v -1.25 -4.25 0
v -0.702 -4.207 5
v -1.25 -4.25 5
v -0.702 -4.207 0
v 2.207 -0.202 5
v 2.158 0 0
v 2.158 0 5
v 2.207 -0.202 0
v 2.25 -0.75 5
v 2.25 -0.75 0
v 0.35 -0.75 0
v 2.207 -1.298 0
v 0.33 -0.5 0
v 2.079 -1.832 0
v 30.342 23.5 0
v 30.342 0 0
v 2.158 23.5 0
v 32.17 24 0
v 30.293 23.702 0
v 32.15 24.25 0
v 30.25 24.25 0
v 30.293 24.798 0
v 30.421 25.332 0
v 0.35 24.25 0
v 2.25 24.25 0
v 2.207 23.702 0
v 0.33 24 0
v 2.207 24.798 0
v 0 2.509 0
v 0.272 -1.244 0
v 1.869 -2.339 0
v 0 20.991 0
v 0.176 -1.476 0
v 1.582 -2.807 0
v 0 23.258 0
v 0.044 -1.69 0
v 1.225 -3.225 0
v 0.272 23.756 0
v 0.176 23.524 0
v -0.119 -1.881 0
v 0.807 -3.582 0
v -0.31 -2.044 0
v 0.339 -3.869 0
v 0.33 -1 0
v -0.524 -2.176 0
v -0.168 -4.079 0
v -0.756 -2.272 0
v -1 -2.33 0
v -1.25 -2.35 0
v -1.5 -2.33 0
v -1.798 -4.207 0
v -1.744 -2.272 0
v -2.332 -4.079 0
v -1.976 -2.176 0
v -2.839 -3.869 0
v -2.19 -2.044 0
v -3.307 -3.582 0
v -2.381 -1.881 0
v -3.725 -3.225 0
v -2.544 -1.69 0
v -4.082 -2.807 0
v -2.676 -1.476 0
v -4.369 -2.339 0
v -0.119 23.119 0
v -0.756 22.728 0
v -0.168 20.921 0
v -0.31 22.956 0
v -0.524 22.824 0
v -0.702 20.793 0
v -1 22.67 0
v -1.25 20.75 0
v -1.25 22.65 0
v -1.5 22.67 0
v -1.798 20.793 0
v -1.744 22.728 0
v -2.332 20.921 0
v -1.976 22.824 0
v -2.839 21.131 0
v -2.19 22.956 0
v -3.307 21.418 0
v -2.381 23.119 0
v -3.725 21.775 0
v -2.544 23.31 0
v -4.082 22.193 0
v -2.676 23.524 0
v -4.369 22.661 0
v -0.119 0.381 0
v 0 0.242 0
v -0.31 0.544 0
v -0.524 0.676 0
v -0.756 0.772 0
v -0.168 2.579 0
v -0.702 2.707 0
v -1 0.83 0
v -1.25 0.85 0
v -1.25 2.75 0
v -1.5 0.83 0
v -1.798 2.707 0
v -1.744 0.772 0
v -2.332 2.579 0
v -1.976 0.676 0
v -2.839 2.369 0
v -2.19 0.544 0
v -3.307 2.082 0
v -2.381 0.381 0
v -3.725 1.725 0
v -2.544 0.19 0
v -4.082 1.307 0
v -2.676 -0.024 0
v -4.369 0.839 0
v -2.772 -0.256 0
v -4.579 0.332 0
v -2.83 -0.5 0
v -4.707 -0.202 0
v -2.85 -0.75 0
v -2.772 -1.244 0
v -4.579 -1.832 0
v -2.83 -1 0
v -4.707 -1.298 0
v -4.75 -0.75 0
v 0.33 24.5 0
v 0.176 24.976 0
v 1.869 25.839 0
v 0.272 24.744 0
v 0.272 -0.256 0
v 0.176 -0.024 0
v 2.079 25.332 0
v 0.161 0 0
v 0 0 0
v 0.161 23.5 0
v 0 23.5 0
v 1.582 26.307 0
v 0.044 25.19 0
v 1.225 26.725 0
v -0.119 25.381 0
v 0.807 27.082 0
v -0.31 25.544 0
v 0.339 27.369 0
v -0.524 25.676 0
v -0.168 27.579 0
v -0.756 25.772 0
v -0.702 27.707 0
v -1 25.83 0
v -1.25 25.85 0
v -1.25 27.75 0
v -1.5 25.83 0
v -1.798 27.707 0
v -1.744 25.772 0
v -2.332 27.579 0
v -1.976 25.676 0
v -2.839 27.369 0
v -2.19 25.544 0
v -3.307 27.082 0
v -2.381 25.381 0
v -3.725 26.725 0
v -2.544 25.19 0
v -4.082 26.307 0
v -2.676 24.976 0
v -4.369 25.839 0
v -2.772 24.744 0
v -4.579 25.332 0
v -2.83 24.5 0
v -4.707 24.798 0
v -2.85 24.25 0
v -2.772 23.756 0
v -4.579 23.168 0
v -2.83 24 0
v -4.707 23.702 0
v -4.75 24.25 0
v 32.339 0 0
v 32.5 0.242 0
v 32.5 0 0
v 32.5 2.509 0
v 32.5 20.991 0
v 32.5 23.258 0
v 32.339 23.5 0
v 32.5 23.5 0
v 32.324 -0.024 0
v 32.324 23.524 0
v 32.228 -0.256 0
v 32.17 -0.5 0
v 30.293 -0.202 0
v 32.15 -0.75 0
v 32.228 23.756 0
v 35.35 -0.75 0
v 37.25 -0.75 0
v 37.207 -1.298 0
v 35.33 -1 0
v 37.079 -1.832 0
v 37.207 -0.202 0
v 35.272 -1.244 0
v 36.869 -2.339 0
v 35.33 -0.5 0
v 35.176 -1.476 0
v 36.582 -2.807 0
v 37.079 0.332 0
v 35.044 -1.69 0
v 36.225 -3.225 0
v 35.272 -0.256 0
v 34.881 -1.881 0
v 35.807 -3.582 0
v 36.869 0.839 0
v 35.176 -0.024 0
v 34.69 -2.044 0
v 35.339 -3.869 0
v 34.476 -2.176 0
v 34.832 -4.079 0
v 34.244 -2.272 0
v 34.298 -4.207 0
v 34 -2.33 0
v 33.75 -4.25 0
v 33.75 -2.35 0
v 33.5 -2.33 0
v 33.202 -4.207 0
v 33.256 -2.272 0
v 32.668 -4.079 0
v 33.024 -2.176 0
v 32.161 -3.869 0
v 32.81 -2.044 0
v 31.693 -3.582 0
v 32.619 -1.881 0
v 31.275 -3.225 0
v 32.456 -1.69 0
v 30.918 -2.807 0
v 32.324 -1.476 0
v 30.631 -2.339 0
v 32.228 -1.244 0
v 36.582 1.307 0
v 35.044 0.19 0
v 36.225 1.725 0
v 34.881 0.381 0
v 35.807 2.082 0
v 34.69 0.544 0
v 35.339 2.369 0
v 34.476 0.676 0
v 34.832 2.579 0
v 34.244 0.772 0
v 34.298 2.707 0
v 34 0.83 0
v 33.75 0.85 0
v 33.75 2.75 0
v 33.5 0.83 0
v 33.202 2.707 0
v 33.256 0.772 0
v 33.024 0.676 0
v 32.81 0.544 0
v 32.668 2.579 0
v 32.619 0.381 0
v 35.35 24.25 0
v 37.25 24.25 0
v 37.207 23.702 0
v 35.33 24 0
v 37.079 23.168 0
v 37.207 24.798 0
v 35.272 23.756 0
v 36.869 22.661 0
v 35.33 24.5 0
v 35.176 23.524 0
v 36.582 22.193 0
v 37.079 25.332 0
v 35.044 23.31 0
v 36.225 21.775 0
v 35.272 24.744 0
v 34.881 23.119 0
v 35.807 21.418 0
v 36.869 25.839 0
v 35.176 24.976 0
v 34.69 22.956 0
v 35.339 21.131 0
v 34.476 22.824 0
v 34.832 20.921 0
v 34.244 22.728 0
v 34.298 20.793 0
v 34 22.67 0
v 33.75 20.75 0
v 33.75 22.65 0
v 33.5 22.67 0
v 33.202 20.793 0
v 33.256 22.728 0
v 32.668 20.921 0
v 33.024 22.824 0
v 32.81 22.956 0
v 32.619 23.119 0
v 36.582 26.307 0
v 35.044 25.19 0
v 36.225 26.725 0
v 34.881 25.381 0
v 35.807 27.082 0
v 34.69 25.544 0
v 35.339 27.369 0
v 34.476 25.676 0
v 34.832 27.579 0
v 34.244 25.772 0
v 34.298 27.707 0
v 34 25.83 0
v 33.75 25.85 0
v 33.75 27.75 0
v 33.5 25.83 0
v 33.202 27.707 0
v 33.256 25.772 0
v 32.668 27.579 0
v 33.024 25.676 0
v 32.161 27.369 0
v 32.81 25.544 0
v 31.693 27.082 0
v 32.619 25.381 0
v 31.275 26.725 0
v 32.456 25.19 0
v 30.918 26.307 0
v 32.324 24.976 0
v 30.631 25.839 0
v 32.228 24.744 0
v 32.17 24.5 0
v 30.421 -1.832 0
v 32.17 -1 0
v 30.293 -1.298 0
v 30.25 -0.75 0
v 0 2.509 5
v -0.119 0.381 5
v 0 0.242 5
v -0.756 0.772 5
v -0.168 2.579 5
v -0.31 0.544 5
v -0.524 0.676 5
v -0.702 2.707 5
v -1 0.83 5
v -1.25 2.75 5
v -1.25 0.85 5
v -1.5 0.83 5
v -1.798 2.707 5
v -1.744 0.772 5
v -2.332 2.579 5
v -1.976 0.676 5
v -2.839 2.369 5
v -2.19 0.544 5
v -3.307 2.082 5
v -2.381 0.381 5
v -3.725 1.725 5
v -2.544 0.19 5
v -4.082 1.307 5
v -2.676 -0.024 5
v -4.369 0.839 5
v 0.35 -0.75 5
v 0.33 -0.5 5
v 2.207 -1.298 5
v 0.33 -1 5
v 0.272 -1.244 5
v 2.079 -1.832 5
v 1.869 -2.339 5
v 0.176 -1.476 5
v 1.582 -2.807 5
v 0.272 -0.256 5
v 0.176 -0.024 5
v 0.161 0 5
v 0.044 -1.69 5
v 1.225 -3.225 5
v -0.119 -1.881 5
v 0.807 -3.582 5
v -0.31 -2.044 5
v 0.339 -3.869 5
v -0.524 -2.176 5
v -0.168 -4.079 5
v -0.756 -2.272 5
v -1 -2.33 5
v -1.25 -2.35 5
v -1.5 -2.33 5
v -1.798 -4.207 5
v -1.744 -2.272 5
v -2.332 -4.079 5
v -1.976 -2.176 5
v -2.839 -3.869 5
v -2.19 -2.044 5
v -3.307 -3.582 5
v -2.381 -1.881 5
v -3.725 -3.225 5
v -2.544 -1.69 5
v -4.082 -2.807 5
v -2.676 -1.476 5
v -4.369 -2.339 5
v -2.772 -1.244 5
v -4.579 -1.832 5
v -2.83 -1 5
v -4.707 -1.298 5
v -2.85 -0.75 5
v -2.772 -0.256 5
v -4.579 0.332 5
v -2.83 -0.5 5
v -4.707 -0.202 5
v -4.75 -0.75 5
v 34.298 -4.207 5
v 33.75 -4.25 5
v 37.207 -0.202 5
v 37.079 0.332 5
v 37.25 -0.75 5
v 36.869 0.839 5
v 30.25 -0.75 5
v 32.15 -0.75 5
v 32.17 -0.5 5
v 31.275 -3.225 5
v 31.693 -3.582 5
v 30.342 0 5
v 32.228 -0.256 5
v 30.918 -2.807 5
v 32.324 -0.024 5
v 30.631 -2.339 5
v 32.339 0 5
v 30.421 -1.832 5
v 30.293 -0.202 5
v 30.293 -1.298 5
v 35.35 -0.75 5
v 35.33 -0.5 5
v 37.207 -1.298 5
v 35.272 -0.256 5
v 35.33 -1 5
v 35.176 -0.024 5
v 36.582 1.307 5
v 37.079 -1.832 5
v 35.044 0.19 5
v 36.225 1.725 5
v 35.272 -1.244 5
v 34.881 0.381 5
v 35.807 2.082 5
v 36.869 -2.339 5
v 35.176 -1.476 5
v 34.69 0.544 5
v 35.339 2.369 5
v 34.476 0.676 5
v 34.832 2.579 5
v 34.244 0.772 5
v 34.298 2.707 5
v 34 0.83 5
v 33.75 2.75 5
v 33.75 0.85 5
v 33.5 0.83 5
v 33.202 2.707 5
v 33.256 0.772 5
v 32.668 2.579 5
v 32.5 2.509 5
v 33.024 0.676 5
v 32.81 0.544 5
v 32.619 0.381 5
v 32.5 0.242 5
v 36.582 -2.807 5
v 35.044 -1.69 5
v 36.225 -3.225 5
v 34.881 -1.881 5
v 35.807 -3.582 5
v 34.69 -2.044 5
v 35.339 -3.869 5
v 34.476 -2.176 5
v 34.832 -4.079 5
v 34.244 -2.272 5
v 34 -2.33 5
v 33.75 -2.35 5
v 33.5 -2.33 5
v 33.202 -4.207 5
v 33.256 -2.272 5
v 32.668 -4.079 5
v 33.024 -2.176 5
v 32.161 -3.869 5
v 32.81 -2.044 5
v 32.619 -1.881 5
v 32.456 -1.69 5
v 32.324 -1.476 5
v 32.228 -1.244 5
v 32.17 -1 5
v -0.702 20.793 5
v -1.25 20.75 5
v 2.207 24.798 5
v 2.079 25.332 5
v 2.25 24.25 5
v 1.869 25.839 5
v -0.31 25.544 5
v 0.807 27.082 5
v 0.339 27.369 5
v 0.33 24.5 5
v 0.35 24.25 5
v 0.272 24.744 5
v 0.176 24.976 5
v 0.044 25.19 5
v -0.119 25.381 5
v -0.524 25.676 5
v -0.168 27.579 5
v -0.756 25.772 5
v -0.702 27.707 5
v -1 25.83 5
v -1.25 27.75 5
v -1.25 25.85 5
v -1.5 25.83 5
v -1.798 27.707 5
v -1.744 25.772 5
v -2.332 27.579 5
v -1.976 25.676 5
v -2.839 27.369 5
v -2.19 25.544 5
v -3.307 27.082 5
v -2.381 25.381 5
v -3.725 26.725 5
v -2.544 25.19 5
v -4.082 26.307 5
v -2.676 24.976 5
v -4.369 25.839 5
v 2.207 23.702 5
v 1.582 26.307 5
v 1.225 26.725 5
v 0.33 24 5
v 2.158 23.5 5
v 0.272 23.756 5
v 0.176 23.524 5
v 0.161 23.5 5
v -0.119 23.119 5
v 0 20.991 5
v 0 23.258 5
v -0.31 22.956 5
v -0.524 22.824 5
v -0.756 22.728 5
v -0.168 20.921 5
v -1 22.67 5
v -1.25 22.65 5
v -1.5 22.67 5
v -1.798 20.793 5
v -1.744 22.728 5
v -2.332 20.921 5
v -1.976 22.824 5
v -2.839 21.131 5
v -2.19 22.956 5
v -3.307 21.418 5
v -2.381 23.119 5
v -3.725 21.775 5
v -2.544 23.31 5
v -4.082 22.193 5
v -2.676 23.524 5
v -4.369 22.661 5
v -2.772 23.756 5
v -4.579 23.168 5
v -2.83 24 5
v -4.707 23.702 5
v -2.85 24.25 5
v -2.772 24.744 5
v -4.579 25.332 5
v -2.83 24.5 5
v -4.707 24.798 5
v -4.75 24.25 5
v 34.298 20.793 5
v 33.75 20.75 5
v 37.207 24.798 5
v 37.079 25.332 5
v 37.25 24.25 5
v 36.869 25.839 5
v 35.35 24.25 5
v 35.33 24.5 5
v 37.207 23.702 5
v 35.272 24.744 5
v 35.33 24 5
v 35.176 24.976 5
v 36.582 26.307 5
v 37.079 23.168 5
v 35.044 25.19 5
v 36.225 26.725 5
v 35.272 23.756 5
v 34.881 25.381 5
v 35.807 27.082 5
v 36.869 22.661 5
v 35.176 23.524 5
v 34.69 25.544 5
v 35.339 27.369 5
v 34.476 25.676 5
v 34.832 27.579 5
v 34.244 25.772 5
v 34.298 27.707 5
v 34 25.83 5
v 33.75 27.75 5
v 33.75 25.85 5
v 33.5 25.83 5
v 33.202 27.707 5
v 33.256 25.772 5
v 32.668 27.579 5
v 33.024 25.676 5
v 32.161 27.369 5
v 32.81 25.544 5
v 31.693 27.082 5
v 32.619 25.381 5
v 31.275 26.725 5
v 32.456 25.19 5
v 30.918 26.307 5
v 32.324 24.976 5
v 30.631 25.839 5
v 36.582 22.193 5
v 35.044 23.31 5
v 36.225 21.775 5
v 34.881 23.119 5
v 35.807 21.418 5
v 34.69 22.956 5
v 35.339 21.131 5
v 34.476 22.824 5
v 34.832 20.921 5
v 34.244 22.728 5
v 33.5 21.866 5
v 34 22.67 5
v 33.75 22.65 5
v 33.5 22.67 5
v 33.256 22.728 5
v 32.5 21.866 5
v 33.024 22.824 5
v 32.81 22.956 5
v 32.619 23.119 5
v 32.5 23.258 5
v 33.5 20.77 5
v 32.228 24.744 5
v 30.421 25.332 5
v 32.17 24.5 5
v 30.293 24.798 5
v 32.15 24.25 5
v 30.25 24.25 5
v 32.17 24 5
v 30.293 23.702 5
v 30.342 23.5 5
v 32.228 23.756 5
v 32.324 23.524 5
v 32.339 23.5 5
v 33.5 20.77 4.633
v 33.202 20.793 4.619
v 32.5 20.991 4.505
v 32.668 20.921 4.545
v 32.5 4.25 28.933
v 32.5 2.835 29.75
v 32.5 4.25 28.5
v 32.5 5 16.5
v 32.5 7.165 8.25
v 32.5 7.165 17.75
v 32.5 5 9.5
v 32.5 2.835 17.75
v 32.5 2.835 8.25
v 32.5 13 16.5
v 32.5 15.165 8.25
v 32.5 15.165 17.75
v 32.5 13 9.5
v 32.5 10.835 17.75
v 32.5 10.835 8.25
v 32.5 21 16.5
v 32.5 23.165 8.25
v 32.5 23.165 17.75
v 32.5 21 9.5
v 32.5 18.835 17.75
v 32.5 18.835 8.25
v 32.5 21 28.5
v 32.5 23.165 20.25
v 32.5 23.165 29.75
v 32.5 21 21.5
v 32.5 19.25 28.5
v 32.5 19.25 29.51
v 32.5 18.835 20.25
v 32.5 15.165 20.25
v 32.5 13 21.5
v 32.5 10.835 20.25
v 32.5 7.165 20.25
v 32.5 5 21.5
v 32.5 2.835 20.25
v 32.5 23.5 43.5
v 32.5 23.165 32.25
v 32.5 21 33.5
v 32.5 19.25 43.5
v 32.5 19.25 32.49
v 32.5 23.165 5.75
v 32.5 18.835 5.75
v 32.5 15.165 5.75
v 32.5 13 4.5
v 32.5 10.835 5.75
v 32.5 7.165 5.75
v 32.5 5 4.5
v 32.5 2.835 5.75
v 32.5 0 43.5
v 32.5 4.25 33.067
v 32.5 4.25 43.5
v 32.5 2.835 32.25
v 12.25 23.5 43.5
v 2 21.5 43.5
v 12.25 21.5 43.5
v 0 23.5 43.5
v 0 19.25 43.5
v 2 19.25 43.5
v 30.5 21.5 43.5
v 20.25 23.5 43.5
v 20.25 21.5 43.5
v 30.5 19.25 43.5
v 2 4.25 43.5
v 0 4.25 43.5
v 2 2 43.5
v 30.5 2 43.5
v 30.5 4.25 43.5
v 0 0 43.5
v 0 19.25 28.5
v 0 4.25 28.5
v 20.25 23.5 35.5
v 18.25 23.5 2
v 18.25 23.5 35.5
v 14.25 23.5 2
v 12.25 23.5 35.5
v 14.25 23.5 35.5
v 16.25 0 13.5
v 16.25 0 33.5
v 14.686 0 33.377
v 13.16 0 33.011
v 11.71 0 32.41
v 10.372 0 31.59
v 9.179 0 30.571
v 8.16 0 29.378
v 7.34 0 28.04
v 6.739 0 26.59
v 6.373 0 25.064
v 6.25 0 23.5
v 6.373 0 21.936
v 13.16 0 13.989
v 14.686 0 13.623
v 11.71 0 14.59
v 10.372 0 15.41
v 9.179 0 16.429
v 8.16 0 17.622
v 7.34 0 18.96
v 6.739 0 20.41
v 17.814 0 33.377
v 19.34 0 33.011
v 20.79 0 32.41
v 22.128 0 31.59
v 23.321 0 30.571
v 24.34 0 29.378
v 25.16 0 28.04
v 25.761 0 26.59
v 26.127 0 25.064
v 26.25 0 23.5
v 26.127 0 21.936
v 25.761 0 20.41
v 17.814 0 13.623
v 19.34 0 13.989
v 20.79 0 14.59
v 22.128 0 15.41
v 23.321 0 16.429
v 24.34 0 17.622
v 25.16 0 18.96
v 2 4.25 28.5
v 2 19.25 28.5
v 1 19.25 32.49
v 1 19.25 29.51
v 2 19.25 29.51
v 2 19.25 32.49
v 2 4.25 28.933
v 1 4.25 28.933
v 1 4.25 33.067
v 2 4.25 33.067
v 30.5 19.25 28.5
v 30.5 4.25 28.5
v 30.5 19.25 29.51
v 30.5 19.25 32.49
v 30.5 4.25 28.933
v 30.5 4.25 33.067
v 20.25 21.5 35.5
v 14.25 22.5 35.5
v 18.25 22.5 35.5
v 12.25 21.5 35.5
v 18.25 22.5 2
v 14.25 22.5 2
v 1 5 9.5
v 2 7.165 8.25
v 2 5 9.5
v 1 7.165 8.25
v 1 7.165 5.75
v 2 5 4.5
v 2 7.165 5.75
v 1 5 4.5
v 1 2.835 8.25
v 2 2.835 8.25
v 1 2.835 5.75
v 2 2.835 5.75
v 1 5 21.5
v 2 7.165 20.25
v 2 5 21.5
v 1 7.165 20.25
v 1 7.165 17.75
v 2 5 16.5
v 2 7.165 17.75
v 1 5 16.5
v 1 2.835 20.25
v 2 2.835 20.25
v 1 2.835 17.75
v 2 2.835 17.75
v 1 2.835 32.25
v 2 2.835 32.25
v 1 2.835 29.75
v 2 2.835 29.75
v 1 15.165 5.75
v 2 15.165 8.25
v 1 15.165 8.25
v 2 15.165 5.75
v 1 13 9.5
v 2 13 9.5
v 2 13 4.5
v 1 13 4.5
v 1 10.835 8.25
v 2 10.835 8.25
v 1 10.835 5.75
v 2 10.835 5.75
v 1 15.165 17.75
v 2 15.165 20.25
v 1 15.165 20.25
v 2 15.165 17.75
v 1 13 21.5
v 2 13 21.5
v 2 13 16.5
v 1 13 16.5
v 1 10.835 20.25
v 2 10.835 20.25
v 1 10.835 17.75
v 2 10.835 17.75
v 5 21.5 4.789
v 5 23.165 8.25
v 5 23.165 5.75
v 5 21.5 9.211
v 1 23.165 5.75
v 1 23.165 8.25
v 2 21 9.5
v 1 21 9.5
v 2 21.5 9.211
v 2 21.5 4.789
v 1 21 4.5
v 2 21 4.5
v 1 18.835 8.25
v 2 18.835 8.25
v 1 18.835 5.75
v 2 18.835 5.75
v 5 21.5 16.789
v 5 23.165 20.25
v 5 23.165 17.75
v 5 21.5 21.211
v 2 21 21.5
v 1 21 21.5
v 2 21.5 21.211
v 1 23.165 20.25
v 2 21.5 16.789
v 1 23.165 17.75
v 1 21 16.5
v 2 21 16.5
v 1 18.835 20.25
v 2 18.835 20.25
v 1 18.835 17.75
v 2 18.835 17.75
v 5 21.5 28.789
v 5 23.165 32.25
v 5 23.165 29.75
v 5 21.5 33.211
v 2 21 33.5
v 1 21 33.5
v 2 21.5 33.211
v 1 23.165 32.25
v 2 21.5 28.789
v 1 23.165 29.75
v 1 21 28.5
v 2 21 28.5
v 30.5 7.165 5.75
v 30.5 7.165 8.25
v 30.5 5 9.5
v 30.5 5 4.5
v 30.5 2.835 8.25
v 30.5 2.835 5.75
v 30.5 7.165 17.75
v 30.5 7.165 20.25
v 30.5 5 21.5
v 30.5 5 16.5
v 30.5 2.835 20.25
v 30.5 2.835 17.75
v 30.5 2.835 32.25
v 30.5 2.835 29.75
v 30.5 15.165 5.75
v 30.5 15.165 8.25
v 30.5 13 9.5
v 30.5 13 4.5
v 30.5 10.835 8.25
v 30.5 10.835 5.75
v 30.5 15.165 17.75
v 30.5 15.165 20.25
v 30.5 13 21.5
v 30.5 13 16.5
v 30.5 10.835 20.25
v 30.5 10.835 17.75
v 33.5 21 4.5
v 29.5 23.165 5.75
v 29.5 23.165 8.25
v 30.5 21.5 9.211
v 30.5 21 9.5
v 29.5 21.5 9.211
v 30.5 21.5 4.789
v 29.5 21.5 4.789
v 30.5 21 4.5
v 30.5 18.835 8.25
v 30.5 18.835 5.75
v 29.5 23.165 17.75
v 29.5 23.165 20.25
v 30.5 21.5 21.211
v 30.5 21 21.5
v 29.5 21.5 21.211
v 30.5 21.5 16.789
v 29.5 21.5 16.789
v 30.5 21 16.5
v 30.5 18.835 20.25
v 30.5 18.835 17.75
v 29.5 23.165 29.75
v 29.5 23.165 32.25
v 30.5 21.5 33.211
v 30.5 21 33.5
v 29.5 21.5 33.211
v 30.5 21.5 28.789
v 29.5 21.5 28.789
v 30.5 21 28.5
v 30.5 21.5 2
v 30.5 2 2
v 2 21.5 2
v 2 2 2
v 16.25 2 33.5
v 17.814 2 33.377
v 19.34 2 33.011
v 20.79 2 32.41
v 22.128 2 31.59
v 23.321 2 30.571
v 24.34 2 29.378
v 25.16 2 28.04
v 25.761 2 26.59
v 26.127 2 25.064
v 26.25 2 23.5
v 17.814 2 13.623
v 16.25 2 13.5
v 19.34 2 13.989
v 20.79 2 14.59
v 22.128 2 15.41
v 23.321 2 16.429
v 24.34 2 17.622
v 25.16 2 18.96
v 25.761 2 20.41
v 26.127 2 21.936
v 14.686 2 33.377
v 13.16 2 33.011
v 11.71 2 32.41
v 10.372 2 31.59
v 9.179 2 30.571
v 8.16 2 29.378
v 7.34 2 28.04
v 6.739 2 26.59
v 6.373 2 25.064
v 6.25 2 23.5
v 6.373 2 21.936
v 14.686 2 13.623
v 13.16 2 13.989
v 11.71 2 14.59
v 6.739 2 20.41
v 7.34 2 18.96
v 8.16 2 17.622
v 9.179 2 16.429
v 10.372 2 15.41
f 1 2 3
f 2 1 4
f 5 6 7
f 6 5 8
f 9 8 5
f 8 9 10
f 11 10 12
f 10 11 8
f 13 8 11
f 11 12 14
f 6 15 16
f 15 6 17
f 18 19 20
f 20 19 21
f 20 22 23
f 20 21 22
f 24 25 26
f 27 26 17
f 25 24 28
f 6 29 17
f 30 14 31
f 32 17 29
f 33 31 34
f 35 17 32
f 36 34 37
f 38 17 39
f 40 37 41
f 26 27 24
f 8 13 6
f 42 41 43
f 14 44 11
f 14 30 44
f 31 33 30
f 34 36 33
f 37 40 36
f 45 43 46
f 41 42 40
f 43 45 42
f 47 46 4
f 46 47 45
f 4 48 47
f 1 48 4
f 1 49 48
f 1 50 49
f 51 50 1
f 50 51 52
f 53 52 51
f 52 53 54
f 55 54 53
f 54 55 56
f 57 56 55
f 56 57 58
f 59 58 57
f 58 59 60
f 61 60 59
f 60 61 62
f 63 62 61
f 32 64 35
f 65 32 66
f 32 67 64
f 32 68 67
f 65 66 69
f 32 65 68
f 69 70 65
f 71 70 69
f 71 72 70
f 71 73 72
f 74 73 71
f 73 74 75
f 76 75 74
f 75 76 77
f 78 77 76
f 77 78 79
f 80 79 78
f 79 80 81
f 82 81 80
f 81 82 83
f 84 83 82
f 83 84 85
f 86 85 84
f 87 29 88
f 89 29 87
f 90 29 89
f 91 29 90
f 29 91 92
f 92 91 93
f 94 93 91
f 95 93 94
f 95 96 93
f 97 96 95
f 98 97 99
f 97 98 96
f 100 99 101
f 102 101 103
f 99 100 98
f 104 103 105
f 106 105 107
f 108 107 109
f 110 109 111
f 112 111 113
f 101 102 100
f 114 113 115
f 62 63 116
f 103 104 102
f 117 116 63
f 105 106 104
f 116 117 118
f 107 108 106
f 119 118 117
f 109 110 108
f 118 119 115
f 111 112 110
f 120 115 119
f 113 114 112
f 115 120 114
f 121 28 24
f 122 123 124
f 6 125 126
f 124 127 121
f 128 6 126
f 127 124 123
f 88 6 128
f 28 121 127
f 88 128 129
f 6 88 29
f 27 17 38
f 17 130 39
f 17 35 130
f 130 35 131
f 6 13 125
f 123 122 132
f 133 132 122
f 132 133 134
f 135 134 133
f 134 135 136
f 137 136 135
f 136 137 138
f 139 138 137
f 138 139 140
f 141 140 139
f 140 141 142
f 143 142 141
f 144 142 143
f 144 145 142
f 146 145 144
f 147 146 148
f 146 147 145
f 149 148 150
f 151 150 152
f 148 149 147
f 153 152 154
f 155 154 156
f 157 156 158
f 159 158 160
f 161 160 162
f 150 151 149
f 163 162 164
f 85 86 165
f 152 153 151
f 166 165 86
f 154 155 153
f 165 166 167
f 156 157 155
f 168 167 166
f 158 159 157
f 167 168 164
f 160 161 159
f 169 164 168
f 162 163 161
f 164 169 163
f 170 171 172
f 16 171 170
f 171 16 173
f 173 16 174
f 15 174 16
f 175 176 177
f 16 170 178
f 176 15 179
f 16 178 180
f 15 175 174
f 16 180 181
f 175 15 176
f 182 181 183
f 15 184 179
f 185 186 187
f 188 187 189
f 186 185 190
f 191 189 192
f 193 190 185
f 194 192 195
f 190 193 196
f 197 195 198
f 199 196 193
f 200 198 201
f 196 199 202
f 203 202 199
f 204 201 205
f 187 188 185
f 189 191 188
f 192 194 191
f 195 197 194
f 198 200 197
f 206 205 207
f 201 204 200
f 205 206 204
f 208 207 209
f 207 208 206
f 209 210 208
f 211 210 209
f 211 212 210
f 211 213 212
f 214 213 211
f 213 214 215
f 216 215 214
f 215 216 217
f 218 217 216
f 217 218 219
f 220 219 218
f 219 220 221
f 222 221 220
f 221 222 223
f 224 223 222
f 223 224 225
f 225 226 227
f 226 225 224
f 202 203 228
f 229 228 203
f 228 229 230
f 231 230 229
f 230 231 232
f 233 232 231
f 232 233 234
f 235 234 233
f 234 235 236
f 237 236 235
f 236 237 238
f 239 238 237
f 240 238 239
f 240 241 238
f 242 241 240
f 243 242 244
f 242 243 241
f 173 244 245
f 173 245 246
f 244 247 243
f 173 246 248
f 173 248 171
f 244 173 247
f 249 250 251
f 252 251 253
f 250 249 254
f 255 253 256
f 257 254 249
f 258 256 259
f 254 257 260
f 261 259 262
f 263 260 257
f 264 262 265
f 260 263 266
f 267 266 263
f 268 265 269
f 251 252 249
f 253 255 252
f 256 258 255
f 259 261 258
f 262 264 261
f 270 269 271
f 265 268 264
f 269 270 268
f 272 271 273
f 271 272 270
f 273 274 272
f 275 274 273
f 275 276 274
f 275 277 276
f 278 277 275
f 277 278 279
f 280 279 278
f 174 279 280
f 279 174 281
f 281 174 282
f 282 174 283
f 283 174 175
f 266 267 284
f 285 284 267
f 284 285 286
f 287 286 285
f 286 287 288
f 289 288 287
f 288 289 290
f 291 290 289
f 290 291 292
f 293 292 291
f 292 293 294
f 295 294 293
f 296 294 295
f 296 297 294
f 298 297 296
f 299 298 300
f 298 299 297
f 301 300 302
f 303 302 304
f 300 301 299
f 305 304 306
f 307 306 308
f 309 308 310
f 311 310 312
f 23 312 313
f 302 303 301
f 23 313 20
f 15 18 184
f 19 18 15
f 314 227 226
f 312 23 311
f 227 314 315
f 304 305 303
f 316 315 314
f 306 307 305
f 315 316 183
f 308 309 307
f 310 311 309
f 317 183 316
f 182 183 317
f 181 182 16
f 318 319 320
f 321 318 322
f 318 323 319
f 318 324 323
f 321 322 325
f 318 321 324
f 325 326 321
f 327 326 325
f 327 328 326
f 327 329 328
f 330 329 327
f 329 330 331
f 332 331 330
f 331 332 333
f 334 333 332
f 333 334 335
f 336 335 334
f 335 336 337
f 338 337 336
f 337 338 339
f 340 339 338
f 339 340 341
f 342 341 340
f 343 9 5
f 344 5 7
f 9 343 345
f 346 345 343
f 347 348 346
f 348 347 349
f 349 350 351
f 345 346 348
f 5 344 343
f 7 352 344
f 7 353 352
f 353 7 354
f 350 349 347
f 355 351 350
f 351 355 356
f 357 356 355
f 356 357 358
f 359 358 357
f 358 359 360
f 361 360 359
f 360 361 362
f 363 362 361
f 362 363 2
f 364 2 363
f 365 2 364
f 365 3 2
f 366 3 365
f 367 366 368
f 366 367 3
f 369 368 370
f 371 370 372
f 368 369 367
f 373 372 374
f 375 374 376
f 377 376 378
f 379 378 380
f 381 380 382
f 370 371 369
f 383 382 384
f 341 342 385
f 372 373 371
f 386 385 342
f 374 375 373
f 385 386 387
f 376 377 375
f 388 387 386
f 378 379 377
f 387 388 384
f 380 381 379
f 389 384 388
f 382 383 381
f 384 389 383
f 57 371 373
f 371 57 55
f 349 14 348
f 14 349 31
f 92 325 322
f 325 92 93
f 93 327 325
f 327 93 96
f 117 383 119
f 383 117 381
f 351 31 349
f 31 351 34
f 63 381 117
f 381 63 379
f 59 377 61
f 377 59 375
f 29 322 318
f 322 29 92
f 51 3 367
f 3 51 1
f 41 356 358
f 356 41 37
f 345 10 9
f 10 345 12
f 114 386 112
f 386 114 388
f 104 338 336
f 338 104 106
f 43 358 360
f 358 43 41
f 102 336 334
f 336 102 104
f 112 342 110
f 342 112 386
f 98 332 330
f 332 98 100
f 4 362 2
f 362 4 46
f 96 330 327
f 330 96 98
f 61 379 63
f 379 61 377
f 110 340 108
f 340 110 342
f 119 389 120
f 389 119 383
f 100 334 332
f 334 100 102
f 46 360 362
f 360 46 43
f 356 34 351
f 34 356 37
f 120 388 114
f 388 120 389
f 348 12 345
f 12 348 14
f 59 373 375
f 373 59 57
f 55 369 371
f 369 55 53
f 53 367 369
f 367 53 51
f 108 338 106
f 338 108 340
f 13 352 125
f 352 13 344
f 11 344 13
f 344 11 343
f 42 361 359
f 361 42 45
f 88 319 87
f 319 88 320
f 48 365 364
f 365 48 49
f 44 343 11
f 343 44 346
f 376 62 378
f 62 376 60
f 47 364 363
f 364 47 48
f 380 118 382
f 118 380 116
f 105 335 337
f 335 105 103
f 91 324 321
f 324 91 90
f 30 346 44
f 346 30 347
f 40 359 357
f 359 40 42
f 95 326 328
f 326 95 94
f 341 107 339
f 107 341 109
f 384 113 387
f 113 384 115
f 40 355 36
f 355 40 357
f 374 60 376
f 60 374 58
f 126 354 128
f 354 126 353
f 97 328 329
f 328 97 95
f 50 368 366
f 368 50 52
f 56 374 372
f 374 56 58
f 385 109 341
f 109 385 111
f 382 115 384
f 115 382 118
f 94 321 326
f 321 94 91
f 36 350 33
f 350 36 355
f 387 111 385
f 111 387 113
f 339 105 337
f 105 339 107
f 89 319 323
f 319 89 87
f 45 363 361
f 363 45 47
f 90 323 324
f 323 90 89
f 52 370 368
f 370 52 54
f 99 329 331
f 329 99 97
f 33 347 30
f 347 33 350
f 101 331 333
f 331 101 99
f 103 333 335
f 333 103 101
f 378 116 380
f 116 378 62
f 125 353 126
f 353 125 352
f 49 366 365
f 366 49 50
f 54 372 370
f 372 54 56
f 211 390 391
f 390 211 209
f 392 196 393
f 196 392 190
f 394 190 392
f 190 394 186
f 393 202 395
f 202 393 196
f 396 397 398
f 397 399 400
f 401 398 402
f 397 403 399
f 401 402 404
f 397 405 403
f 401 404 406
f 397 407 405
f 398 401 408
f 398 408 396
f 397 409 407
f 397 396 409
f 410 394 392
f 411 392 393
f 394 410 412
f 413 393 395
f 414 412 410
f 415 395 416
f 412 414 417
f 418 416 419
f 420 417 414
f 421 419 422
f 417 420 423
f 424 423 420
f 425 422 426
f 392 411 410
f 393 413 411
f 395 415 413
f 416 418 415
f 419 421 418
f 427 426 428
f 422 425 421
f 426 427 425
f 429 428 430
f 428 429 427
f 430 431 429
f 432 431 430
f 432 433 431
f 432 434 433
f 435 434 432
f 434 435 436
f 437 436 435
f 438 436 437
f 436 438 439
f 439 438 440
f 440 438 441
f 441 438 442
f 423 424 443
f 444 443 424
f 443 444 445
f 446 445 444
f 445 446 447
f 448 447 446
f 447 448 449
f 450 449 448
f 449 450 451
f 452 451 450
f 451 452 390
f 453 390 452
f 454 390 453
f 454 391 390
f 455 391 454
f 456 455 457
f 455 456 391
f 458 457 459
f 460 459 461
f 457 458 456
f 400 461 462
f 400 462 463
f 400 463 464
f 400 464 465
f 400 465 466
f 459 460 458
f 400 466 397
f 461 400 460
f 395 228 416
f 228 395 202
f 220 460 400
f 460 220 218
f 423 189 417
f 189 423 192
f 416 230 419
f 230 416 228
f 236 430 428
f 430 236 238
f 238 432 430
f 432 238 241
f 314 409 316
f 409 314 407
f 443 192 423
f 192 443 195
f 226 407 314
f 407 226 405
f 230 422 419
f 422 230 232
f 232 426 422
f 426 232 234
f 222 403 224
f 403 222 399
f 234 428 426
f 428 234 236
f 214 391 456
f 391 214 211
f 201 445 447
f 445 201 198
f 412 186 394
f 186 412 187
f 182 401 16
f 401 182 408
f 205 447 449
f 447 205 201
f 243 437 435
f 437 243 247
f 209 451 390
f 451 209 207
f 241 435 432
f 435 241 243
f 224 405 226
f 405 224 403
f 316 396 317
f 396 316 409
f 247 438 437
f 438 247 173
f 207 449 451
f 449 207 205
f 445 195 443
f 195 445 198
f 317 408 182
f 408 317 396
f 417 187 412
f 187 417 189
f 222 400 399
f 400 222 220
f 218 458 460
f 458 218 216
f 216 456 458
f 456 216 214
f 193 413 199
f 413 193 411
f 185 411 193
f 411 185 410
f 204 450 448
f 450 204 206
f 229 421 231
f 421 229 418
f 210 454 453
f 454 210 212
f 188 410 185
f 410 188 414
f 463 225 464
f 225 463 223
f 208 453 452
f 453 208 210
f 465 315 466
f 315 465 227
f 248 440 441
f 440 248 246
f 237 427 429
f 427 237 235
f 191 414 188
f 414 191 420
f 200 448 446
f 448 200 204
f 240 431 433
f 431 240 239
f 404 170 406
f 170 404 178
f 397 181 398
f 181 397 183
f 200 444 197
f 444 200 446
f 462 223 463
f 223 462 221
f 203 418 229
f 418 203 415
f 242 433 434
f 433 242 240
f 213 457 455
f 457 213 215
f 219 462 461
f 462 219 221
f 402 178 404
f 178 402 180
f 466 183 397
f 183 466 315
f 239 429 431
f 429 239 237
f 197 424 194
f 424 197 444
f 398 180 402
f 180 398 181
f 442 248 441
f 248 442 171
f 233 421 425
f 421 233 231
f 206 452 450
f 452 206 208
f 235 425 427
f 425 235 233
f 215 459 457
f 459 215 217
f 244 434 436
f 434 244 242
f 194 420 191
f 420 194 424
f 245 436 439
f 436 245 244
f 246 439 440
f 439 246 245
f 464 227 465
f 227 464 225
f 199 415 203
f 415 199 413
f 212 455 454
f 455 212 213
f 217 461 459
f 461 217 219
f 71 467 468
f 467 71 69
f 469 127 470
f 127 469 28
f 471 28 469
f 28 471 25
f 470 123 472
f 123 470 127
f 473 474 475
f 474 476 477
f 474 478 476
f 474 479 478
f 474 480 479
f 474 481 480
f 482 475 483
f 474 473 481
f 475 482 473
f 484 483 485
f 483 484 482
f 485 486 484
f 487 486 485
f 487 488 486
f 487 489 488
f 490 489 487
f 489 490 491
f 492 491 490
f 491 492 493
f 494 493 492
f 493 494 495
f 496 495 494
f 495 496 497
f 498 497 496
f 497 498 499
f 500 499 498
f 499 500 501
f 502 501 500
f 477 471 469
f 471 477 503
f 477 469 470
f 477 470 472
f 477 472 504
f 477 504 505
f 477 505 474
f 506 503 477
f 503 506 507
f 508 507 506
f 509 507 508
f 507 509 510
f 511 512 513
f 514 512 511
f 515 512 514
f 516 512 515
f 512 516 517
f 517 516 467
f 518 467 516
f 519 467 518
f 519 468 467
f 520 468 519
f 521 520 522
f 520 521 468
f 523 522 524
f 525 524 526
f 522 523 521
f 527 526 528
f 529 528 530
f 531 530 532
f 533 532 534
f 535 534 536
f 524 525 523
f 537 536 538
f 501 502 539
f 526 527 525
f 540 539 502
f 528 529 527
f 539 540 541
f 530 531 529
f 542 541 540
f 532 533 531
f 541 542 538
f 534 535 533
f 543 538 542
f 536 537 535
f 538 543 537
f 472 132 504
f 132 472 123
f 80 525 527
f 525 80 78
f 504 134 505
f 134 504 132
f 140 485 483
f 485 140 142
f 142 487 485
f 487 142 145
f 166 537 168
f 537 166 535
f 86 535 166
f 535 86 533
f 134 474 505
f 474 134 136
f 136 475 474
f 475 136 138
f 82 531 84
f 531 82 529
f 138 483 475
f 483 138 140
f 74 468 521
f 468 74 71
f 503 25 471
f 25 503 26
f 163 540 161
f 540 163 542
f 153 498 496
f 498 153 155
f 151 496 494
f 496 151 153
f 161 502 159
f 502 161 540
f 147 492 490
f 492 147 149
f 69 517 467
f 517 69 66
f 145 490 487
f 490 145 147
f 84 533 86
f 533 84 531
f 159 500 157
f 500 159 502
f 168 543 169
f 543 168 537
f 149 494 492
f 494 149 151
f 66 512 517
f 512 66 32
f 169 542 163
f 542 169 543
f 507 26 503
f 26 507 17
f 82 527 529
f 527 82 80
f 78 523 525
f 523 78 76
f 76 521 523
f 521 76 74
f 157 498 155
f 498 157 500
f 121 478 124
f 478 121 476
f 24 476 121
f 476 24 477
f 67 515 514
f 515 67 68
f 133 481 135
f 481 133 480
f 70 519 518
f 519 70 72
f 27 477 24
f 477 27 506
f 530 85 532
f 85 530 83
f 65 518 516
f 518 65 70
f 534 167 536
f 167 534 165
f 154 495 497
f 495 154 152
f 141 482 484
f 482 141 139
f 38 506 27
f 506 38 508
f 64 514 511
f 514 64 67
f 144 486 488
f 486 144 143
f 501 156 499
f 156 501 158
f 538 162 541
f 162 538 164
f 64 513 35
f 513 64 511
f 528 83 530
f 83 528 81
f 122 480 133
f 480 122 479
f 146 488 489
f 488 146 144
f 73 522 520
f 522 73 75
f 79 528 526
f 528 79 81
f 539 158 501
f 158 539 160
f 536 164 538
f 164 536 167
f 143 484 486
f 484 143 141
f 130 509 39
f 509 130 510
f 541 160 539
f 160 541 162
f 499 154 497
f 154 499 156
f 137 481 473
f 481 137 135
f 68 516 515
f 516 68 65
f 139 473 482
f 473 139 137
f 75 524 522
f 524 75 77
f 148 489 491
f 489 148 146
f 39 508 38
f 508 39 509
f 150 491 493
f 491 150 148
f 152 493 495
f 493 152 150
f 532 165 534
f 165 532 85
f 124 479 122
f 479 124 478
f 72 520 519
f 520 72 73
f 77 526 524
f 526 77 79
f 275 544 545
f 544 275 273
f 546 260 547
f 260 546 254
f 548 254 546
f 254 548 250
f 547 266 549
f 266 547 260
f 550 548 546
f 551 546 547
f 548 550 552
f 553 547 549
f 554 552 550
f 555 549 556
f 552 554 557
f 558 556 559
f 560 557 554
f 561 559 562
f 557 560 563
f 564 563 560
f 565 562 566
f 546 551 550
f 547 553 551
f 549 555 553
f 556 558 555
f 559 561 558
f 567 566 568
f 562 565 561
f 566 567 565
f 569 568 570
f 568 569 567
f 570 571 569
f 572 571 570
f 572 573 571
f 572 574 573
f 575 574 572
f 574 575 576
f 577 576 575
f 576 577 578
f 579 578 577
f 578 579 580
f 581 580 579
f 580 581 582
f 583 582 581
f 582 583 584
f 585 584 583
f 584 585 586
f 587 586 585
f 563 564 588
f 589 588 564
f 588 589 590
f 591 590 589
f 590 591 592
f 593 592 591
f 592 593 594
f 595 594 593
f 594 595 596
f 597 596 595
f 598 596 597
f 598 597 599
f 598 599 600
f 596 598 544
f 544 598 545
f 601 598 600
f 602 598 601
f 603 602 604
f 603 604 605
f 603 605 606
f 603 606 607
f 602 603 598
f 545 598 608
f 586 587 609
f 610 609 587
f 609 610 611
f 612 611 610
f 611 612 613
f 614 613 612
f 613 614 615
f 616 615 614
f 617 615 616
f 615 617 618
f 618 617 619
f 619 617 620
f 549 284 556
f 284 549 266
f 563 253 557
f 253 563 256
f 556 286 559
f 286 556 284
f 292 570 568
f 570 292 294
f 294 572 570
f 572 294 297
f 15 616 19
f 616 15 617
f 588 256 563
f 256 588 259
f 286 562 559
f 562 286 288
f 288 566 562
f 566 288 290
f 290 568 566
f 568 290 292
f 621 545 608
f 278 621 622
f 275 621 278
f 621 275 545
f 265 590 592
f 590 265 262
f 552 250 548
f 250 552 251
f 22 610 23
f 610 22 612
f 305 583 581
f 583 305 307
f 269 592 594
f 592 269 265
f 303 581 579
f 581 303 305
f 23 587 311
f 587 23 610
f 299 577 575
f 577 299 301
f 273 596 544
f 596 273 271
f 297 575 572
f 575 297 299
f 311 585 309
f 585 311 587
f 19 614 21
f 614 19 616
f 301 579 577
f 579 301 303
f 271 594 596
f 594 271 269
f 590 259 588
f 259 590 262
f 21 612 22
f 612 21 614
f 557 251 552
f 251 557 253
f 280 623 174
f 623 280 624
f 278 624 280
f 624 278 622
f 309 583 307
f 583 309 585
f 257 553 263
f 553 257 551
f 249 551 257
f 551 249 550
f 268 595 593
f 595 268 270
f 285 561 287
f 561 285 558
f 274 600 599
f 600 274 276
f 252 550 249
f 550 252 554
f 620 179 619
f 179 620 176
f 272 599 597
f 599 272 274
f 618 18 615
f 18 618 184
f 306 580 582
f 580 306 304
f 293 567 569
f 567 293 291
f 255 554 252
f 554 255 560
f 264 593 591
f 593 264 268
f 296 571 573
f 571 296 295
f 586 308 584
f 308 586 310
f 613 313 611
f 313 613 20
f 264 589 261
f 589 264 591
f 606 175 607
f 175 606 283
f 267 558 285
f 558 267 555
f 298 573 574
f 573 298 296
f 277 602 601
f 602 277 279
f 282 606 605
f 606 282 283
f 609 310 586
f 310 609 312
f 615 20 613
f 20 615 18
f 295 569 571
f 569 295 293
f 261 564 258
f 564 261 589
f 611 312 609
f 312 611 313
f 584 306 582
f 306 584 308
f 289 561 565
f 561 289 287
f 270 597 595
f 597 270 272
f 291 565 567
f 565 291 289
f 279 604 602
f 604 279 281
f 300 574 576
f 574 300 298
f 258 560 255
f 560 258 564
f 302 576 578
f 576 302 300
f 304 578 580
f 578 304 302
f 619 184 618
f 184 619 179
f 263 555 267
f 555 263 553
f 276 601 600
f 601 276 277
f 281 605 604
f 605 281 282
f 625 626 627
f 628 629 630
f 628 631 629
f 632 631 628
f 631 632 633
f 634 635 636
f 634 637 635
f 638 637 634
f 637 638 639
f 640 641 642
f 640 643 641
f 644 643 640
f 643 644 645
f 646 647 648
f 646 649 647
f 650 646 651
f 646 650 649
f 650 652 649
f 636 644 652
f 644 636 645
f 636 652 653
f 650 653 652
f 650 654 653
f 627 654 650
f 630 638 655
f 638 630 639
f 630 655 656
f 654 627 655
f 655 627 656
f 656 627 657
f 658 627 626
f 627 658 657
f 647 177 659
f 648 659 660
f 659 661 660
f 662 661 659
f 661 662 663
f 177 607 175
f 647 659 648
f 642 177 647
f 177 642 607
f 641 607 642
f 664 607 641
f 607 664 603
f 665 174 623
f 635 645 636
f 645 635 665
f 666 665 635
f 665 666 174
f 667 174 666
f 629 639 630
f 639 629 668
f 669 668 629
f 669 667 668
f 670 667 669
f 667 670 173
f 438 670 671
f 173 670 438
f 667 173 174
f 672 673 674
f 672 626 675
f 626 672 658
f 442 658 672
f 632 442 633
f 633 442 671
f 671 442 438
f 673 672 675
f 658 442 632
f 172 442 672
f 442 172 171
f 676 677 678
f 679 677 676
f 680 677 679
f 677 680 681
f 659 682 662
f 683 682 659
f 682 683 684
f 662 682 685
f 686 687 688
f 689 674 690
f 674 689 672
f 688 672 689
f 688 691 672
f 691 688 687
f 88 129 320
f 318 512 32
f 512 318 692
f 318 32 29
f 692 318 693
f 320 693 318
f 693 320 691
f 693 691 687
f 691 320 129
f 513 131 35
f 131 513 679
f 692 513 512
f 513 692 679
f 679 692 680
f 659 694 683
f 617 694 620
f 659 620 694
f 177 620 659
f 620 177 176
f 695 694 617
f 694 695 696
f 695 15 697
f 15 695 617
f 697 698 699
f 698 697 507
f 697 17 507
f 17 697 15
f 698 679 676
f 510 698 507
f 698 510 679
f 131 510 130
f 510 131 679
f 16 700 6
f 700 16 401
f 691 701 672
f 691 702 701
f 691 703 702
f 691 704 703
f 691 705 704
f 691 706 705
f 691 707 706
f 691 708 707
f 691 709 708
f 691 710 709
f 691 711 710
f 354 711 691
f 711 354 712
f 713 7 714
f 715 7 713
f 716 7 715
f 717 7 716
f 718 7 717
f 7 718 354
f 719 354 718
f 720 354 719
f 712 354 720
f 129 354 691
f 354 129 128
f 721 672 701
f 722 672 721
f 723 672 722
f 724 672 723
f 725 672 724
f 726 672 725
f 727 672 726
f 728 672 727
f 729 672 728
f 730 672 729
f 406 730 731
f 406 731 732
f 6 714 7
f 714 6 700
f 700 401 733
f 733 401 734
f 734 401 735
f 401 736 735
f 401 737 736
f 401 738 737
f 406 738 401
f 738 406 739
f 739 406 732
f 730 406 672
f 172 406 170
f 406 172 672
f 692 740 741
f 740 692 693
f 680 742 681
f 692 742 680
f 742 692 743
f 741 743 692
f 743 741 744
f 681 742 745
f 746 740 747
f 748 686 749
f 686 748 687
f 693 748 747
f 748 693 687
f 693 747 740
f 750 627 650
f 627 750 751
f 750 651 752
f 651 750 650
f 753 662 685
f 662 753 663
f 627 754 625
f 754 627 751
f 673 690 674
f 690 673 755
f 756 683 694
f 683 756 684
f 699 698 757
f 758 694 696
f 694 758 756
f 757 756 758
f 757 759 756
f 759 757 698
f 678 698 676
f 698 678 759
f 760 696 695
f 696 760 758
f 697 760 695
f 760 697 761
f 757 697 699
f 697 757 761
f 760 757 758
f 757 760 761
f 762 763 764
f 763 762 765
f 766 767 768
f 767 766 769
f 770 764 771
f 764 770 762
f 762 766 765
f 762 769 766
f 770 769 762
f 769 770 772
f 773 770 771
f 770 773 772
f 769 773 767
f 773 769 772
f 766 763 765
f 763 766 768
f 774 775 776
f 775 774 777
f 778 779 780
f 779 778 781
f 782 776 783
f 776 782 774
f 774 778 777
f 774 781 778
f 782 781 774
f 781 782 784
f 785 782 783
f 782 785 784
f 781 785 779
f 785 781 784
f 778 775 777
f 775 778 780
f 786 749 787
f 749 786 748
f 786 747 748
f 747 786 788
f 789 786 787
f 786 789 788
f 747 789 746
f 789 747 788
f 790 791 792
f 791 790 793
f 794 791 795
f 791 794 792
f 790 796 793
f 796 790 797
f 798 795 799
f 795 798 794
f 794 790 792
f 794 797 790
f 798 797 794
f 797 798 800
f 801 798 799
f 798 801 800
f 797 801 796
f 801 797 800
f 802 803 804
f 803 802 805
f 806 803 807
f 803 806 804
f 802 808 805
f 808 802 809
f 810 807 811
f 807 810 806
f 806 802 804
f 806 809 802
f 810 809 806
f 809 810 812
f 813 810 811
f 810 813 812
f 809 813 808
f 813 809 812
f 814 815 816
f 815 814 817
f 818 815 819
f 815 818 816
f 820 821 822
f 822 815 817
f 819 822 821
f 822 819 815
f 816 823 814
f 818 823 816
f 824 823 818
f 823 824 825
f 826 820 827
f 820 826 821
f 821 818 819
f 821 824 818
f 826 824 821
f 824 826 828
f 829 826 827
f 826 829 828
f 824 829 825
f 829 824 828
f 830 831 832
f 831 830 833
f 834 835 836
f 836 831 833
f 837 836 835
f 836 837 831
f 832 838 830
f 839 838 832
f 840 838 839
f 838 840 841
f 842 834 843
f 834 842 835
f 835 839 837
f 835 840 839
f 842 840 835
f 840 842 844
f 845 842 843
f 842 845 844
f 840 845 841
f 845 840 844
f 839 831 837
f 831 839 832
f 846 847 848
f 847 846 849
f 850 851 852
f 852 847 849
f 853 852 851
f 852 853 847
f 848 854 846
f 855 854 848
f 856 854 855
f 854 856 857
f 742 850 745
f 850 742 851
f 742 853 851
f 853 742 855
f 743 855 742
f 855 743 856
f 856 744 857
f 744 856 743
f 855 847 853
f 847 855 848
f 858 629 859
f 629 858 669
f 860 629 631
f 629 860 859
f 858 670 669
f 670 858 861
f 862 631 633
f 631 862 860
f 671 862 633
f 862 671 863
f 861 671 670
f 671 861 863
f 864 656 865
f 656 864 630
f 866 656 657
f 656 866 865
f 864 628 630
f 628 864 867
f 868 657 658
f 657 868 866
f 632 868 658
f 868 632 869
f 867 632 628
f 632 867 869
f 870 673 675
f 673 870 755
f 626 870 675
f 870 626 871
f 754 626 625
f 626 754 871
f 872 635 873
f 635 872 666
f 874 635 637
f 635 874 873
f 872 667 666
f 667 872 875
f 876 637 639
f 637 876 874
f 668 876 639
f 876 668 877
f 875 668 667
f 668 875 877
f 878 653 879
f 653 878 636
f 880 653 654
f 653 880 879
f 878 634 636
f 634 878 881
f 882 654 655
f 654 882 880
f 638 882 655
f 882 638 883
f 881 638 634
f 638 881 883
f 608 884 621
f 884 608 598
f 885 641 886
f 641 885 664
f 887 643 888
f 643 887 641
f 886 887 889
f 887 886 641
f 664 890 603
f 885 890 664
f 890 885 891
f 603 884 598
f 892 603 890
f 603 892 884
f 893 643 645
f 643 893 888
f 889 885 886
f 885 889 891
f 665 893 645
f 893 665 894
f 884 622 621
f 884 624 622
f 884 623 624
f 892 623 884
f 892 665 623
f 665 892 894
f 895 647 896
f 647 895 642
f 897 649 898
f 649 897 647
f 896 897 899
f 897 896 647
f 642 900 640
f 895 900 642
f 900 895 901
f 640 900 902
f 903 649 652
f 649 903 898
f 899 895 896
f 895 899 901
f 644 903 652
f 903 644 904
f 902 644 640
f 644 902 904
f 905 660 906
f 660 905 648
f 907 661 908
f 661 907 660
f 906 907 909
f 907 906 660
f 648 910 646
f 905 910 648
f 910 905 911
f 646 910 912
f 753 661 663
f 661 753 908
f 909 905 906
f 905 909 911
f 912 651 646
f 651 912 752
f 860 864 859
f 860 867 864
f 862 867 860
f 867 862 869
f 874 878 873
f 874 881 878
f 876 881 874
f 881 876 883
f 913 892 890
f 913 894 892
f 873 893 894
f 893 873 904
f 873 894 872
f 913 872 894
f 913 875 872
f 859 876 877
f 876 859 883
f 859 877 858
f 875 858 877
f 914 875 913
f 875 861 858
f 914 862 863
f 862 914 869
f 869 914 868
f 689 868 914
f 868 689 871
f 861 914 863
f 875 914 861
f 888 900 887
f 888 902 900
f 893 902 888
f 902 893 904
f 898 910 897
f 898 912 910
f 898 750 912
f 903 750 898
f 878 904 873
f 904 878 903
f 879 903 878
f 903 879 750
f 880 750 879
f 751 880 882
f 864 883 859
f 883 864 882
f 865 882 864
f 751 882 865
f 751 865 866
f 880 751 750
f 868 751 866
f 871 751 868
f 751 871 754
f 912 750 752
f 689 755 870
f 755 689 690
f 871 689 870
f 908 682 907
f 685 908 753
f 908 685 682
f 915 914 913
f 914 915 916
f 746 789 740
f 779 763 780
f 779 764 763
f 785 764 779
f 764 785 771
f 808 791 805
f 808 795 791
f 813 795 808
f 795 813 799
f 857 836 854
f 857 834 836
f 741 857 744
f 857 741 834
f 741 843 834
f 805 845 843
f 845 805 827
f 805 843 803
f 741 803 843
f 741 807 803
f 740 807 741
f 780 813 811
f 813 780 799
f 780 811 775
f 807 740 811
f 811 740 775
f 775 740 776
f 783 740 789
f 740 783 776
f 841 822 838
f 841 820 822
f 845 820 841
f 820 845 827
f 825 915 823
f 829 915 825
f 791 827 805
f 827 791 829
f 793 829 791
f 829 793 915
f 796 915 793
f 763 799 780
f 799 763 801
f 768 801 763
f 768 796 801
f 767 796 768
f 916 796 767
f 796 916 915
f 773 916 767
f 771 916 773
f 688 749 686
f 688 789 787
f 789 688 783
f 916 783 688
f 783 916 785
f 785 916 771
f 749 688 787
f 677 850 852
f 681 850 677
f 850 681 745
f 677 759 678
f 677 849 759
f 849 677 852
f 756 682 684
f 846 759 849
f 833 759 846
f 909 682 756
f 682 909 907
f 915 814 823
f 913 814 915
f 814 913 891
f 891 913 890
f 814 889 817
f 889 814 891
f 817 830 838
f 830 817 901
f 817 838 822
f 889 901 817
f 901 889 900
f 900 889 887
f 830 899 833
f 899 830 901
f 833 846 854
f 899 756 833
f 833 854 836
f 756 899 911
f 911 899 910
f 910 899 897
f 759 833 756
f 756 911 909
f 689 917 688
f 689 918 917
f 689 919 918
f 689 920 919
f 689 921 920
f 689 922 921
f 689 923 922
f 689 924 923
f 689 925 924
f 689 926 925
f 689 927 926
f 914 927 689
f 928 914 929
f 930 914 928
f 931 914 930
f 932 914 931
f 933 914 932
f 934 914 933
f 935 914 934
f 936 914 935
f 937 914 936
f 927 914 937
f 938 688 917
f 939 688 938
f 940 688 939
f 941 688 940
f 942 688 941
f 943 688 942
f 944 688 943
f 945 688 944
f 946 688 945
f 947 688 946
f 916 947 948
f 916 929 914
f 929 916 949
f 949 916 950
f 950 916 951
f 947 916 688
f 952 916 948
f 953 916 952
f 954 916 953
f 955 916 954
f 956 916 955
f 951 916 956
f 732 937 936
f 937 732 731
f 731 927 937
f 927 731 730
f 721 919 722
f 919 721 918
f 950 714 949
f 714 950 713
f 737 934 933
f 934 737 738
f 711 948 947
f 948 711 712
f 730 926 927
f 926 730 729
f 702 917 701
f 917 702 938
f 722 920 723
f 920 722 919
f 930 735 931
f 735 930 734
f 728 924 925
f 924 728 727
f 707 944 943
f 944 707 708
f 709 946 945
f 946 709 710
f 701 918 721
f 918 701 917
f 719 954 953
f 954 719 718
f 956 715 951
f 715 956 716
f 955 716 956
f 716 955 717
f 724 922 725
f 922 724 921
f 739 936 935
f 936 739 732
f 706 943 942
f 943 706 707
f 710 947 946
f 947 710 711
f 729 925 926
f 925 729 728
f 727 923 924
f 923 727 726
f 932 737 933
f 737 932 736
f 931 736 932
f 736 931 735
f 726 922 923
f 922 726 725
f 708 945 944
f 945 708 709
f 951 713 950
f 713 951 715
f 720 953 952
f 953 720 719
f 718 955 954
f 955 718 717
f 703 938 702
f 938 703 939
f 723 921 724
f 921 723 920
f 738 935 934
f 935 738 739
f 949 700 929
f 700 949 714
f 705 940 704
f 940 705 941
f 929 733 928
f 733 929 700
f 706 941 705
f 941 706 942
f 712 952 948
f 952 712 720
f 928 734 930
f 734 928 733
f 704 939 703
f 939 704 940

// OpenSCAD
// ============================================================================
// COMPACT PORTABLE RF POWER METER - 9V BATTERY HOLDER
// For digital version with Arduino and LCD/OLED display
// Design: Claude Code - 2025
// ============================================================================

// PARAMETERS
// ============================================================================

// Standard 9V battery dimensions (PP3 / 6LR61)
battery_width = 26.5;        // Width of 9V battery
battery_depth = 17.5;        // Depth of 9V battery
battery_height = 48.5;       // Height of 9V battery
battery_clearance = 1;       // Extra space for easy insertion/removal

// Holder dimensions
holder_wall = 2;             // Wall thickness
holder_base = 2;             // Base thickness
holder_height = battery_height - 5;  // Leave top exposed for removal

// Mounting to enclosure
mount_hole_diameter = 3.2;   // M3 clearance
mount_boss_diameter = 7;
mount_spacing_x = 35;        // Distance between mounting holes
mount_spacing_y = 25;

// Contact springs (for commercial battery clip alternative)
contact_cutout_width = 8;    // Width for battery snap connector
contact_cutout_depth = 3;    // Depth for battery snap connector

// Strap slot (for elastic band to hold battery)
strap_width = 15;            // Width of elastic strap slot
strap_thickness = 2;         // Thickness of elastic band

// Print settings
$fn = 40;

// RENDER MODE
// ============================================================================
render_mode = "holder";      // Options: "holder", "lid", "complete"

// MAIN MODULES
// ============================================================================

module battery_holder() {
    difference() {
        union() {
            // Main holder body
            cube([
                battery_width + 2*holder_wall + 2*battery_clearance,
                battery_depth + 2*holder_wall + 2*battery_clearance,
                holder_height
            ]);

            // Mounting bosses (bottom)
            mounting_bosses();
        }

        // Battery cavity
        translate([holder_wall, holder_wall, holder_base])
            cube([
                battery_width + 2*battery_clearance,
                battery_depth + 2*battery_clearance,
                holder_height
            ]);

        // Strap slots (to hold battery with elastic band)
        strap_slots();

        // Contact cutout (top rear, for battery snap connector)
        contact_connector_cutout();

        // Weight reduction cutouts (sides)
        weight_reduction_cutouts();

        // Finger cutout (front) for easy battery removal
        finger_cutout();
    }

    // Contact spring guide (optional, if using custom contacts)
    // contact_spring_guides();
}

// Optional lid (if you want fully enclosed holder)
module battery_lid() {
    lid_width = battery_width + 2*holder_wall + 2*battery_clearance;
    lid_depth = battery_depth + 2*holder_wall + 2*battery_clearance;
    lid_thick = 2;

    difference() {
        // Main lid
        cube([lid_width, lid_depth, lid_thick]);

        // Finger hole for opening
        translate([lid_width/2, lid_depth/2, -0.5])
            cylinder(d=12, h=lid_thick+1);

        // Text label
        translate([lid_width/2, lid_depth - 5, lid_thick - 0.6])
            linear_extrude(0.7)
            text("9V", size=5, halign="center", valign="center", font="Liberation Sans:style=Bold");
    }

    // Clips to snap onto holder (simple friction fit)
    clip_positions = [
        [2, lid_depth/2],
        [lid_width - 2, lid_depth/2]
    ];

    for (pos = clip_positions) {
        translate([pos[0], pos[1], -2])
            lid_clip();
    }
}

// HELPER MODULES
// ============================================================================

// Mounting bosses on bottom of holder
module mounting_bosses() {
    holder_width = battery_width + 2*holder_wall + 2*battery_clearance;
    holder_depth = battery_depth + 2*holder_wall + 2*battery_clearance;

    boss_positions = [
        [holder_width/2 - mount_spacing_x/2, holder_depth/2 - mount_spacing_y/2],
        [holder_width/2 + mount_spacing_x/2, holder_depth/2 - mount_spacing_y/2],
        [holder_width/2 - mount_spacing_x/2, holder_depth/2 + mount_spacing_y/2],
        [holder_width/2 + mount_spacing_x/2, holder_depth/2 + mount_spacing_y/2]
    ];

    for (pos = boss_positions) {
        translate([pos[0], pos[1], 0])
            mounting_boss();
    }
}

// Single mounting boss
module mounting_boss() {
    difference() {
        cylinder(d=mount_boss_diameter, h=holder_base + 3);

        // Screw hole
        translate([0, 0, -0.5])
            cylinder(d=mount_hole_diameter, h=holder_base + 4);
    }
}

// Strap slots to hold battery with elastic band
module strap_slots() {
    holder_width = battery_width + 2*holder_wall + 2*battery_clearance;

    // Vertical slots on left and right sides
    slot_positions = [
        [0, holder_wall + battery_clearance + battery_depth/2 - strap_width/2],
        [holder_width - strap_thickness - 1, holder_wall + battery_clearance + battery_depth/2 - strap_width/2]
    ];

    for (pos = slot_positions) {
        translate([pos[0], pos[1], holder_height - 15])
            cube([strap_thickness + 1, strap_width, 20]);
    }
}

// Contact connector cutout (for standard 9V battery snap)
module contact_connector_cutout() {
    holder_width = battery_width + 2*holder_wall + 2*battery_clearance;
    holder_depth = battery_depth + 2*holder_wall + 2*battery_clearance;

    // Cutout at top rear for battery snap connector
    translate([holder_width/2 - contact_cutout_width/2, holder_depth - contact_cutout_depth - 1, holder_height - 8])
        cube([contact_cutout_width, contact_cutout_depth + 2, 10]);

    // Wire routing channel
    translate([holder_width/2 - 2, holder_depth - 1, holder_base])
        cube([4, 2, holder_height]);
}

// Weight reduction cutouts (honeycomb pattern on sides)
module weight_reduction_cutouts() {
    // Left side
    for (y = [0:2]) {
        for (z = [0:2]) {
            translate([holder_wall - 1, 5 + y*8, holder_base + 5 + z*12])
                rotate([0, 90, 0])
                cylinder(d=5, h=holder_wall + 2, $fn=6);
        }
    }

    // Right side
    holder_width = battery_width + 2*holder_wall + 2*battery_clearance;

    for (y = [0:2]) {
        for (z = [0:2]) {
            translate([holder_width - holder_wall - 1, 5 + y*8, holder_base + 5 + z*12])
                rotate([0, 90, 0])
                cylinder(d=5, h=holder_wall + 2, $fn=6);
        }
    }
}

// Finger cutout for easy battery removal
module finger_cutout() {
    holder_width = battery_width + 2*holder_wall + 2*battery_clearance;

    translate([holder_width/2, -1, holder_height - 20])
        rotate([-90, 0, 0])
        cylinder(d=20, h=holder_wall + 2);
}

// Contact spring guides (if making custom contacts instead of using snap connector)
module contact_spring_guides() {
    holder_width = battery_width + 2*holder_wall + 2*battery_clearance;
    holder_depth = battery_depth + 2*holder_wall + 2*battery_clearance;

    // Positive terminal guide (top)
    translate([holder_width/2 - 3, holder_depth/2 - 3, holder_height])
        difference() {
            cube([6, 6, 2]);

            translate([3, 3, -0.5])
                cylinder(d=4, h=3);
        }

    // Negative terminal guide (bottom)
    translate([holder_width/2 - 8, holder_depth/2 - 8, holder_base - 2])
        difference() {
            cube([16, 16, 2]);

            translate([8, 8, -0.5])
                cylinder(d=12, h=3);
        }
}

// Lid clips for snap-fit lid
module lid_clip() {
    difference() {
        cube([3, 4, 2]);

        translate([1.5, 0, 1])
            rotate([-90, 0, 0])
            cylinder(d=1.5, h=5);
    }
}

// ASSEMBLY
// ============================================================================

if (render_mode == "holder") {
    battery_holder();
}
else if (render_mode == "lid") {
    battery_lid();
}
else if (render_mode == "complete") {
    battery_holder();

    // Show lid in open position (for visualization)
    translate([0, 0, holder_height + 5])
        battery_lid();
}
else {
    battery_holder();
}

// PRINTING NOTES
// ============================================================================
// Material: PETG or PLA (PETG preferred for durability)
// Layer height: 0.2-0.3mm
// Infill: 20-30%
// Supports: Not required
// Perimeters: 3 for strength
// Print time: ~2-3 hours (holder), ~30 min (lid)
//
// HOLDER:
// - Print with base flat on bed (as modeled)
// - No supports needed
// - Ensure good first layer adhesion
//
// LID (optional):
// - Print flat side down
// - Clips should print upward (may be fragile)
//
// Post-processing:
// - Clean any stringing inside battery cavity
// - Test fit 9V battery (should slide in easily)
// - Test elastic strap fits through slots
// - Verify mounting holes align with enclosure
//
// ASSEMBLY INSTRUCTIONS:
//
// USING COMMERCIAL BATTERY SNAP CONNECTOR (RECOMMENDED):
// 1. Solder battery snap to power circuit
//    - Red wire: +9V
//    - Black wire: GND
//    - Add polarity protection diode (1N4001)
//
// 2. Route wires through contact cutout
//    - Wire exits at top rear of holder
//    - Leave enough slack for battery removal
//
// 3. Mount holder in enclosure
//    - Position near Arduino or voltage regulator
//    - Secure with M3 x 10mm screws
//    - Ensure clearance for lid/top of enclosure
//
// 4. Insert battery
//    - Connect battery snap to battery
//    - Slide battery into holder
//    - Secure with elastic band through strap slots
//
// 5. Optional: Install lid
//    - Snap lid onto holder
//    - Or leave open for quick battery changes
//
// ALTERNATIVE: CUSTOM SPRING CONTACTS
// If you want to make custom contacts:
// 1. Use phosphor bronze spring wire (0.5mm)
// 2. Shape springs to press against battery terminals
// 3. Solder wires to springs
// 4. Install springs in holder before inserting battery
// 5. Use contact_spring_guides() module
//
// ELASTIC STRAP:
// - Use 10-15mm wide elastic band
// - Cut to length (approximately 70mm)
// - Thread through both strap slots
// - Tie or sew ends together
// - Should hold battery firmly but allow removal
//
// Alternative: Use velcro strap or cable tie
//
// BATTERY LIFE ESTIMATES:
// - Arduino Nano + LCD backlight ON: ~20-30 hours
// - Arduino Nano + LCD backlight OFF: ~50-80 hours
// - Arduino Nano + OLED: ~60-100 hours
// - Add low battery indicator in Arduino code
// - Consider adding USB-C power option
//
// POWER MANAGEMENT:
// - Use voltage regulator (7805 or LDO) if needed
// - Arduino Nano has onboard regulator (VIN accepts 7-12V)
// - Add power switch on front panel (recommended)
// - Consider adding auto-shutoff after inactivity
//
// USB POWER ALTERNATIVE:
// Instead of 9V battery, you can:
// 1. Add USB-C connector to enclosure
// 2. Connect to Arduino USB port
// 3. Power from USB power bank or phone charger
// 4. No battery holder needed
// 5. Continuous power for portable operation
//
// CUSTOMIZATION:
// - Modify dimensions for different battery types:
//   - AA battery pack (4x AA = 6V)
//   - 18650 Li-ion cell (3.7V, needs boost converter)
//   - CR2032 coin cell (for low-power OLED only)
//
// SAFETY:
// - Always observe battery polarity (snap connector prevents reversal)
// - Don't short circuit battery
// - Remove battery when not in use for extended periods
// - Replace battery when voltage drops below 7V
// - Dispose of batteries properly (recycle)
//
// MAINTENANCE:
// - Check battery voltage periodically
// - Clean contacts if corrosion appears
// - Replace elastic strap if it stretches out
// - Keep spare 9V battery on hand
